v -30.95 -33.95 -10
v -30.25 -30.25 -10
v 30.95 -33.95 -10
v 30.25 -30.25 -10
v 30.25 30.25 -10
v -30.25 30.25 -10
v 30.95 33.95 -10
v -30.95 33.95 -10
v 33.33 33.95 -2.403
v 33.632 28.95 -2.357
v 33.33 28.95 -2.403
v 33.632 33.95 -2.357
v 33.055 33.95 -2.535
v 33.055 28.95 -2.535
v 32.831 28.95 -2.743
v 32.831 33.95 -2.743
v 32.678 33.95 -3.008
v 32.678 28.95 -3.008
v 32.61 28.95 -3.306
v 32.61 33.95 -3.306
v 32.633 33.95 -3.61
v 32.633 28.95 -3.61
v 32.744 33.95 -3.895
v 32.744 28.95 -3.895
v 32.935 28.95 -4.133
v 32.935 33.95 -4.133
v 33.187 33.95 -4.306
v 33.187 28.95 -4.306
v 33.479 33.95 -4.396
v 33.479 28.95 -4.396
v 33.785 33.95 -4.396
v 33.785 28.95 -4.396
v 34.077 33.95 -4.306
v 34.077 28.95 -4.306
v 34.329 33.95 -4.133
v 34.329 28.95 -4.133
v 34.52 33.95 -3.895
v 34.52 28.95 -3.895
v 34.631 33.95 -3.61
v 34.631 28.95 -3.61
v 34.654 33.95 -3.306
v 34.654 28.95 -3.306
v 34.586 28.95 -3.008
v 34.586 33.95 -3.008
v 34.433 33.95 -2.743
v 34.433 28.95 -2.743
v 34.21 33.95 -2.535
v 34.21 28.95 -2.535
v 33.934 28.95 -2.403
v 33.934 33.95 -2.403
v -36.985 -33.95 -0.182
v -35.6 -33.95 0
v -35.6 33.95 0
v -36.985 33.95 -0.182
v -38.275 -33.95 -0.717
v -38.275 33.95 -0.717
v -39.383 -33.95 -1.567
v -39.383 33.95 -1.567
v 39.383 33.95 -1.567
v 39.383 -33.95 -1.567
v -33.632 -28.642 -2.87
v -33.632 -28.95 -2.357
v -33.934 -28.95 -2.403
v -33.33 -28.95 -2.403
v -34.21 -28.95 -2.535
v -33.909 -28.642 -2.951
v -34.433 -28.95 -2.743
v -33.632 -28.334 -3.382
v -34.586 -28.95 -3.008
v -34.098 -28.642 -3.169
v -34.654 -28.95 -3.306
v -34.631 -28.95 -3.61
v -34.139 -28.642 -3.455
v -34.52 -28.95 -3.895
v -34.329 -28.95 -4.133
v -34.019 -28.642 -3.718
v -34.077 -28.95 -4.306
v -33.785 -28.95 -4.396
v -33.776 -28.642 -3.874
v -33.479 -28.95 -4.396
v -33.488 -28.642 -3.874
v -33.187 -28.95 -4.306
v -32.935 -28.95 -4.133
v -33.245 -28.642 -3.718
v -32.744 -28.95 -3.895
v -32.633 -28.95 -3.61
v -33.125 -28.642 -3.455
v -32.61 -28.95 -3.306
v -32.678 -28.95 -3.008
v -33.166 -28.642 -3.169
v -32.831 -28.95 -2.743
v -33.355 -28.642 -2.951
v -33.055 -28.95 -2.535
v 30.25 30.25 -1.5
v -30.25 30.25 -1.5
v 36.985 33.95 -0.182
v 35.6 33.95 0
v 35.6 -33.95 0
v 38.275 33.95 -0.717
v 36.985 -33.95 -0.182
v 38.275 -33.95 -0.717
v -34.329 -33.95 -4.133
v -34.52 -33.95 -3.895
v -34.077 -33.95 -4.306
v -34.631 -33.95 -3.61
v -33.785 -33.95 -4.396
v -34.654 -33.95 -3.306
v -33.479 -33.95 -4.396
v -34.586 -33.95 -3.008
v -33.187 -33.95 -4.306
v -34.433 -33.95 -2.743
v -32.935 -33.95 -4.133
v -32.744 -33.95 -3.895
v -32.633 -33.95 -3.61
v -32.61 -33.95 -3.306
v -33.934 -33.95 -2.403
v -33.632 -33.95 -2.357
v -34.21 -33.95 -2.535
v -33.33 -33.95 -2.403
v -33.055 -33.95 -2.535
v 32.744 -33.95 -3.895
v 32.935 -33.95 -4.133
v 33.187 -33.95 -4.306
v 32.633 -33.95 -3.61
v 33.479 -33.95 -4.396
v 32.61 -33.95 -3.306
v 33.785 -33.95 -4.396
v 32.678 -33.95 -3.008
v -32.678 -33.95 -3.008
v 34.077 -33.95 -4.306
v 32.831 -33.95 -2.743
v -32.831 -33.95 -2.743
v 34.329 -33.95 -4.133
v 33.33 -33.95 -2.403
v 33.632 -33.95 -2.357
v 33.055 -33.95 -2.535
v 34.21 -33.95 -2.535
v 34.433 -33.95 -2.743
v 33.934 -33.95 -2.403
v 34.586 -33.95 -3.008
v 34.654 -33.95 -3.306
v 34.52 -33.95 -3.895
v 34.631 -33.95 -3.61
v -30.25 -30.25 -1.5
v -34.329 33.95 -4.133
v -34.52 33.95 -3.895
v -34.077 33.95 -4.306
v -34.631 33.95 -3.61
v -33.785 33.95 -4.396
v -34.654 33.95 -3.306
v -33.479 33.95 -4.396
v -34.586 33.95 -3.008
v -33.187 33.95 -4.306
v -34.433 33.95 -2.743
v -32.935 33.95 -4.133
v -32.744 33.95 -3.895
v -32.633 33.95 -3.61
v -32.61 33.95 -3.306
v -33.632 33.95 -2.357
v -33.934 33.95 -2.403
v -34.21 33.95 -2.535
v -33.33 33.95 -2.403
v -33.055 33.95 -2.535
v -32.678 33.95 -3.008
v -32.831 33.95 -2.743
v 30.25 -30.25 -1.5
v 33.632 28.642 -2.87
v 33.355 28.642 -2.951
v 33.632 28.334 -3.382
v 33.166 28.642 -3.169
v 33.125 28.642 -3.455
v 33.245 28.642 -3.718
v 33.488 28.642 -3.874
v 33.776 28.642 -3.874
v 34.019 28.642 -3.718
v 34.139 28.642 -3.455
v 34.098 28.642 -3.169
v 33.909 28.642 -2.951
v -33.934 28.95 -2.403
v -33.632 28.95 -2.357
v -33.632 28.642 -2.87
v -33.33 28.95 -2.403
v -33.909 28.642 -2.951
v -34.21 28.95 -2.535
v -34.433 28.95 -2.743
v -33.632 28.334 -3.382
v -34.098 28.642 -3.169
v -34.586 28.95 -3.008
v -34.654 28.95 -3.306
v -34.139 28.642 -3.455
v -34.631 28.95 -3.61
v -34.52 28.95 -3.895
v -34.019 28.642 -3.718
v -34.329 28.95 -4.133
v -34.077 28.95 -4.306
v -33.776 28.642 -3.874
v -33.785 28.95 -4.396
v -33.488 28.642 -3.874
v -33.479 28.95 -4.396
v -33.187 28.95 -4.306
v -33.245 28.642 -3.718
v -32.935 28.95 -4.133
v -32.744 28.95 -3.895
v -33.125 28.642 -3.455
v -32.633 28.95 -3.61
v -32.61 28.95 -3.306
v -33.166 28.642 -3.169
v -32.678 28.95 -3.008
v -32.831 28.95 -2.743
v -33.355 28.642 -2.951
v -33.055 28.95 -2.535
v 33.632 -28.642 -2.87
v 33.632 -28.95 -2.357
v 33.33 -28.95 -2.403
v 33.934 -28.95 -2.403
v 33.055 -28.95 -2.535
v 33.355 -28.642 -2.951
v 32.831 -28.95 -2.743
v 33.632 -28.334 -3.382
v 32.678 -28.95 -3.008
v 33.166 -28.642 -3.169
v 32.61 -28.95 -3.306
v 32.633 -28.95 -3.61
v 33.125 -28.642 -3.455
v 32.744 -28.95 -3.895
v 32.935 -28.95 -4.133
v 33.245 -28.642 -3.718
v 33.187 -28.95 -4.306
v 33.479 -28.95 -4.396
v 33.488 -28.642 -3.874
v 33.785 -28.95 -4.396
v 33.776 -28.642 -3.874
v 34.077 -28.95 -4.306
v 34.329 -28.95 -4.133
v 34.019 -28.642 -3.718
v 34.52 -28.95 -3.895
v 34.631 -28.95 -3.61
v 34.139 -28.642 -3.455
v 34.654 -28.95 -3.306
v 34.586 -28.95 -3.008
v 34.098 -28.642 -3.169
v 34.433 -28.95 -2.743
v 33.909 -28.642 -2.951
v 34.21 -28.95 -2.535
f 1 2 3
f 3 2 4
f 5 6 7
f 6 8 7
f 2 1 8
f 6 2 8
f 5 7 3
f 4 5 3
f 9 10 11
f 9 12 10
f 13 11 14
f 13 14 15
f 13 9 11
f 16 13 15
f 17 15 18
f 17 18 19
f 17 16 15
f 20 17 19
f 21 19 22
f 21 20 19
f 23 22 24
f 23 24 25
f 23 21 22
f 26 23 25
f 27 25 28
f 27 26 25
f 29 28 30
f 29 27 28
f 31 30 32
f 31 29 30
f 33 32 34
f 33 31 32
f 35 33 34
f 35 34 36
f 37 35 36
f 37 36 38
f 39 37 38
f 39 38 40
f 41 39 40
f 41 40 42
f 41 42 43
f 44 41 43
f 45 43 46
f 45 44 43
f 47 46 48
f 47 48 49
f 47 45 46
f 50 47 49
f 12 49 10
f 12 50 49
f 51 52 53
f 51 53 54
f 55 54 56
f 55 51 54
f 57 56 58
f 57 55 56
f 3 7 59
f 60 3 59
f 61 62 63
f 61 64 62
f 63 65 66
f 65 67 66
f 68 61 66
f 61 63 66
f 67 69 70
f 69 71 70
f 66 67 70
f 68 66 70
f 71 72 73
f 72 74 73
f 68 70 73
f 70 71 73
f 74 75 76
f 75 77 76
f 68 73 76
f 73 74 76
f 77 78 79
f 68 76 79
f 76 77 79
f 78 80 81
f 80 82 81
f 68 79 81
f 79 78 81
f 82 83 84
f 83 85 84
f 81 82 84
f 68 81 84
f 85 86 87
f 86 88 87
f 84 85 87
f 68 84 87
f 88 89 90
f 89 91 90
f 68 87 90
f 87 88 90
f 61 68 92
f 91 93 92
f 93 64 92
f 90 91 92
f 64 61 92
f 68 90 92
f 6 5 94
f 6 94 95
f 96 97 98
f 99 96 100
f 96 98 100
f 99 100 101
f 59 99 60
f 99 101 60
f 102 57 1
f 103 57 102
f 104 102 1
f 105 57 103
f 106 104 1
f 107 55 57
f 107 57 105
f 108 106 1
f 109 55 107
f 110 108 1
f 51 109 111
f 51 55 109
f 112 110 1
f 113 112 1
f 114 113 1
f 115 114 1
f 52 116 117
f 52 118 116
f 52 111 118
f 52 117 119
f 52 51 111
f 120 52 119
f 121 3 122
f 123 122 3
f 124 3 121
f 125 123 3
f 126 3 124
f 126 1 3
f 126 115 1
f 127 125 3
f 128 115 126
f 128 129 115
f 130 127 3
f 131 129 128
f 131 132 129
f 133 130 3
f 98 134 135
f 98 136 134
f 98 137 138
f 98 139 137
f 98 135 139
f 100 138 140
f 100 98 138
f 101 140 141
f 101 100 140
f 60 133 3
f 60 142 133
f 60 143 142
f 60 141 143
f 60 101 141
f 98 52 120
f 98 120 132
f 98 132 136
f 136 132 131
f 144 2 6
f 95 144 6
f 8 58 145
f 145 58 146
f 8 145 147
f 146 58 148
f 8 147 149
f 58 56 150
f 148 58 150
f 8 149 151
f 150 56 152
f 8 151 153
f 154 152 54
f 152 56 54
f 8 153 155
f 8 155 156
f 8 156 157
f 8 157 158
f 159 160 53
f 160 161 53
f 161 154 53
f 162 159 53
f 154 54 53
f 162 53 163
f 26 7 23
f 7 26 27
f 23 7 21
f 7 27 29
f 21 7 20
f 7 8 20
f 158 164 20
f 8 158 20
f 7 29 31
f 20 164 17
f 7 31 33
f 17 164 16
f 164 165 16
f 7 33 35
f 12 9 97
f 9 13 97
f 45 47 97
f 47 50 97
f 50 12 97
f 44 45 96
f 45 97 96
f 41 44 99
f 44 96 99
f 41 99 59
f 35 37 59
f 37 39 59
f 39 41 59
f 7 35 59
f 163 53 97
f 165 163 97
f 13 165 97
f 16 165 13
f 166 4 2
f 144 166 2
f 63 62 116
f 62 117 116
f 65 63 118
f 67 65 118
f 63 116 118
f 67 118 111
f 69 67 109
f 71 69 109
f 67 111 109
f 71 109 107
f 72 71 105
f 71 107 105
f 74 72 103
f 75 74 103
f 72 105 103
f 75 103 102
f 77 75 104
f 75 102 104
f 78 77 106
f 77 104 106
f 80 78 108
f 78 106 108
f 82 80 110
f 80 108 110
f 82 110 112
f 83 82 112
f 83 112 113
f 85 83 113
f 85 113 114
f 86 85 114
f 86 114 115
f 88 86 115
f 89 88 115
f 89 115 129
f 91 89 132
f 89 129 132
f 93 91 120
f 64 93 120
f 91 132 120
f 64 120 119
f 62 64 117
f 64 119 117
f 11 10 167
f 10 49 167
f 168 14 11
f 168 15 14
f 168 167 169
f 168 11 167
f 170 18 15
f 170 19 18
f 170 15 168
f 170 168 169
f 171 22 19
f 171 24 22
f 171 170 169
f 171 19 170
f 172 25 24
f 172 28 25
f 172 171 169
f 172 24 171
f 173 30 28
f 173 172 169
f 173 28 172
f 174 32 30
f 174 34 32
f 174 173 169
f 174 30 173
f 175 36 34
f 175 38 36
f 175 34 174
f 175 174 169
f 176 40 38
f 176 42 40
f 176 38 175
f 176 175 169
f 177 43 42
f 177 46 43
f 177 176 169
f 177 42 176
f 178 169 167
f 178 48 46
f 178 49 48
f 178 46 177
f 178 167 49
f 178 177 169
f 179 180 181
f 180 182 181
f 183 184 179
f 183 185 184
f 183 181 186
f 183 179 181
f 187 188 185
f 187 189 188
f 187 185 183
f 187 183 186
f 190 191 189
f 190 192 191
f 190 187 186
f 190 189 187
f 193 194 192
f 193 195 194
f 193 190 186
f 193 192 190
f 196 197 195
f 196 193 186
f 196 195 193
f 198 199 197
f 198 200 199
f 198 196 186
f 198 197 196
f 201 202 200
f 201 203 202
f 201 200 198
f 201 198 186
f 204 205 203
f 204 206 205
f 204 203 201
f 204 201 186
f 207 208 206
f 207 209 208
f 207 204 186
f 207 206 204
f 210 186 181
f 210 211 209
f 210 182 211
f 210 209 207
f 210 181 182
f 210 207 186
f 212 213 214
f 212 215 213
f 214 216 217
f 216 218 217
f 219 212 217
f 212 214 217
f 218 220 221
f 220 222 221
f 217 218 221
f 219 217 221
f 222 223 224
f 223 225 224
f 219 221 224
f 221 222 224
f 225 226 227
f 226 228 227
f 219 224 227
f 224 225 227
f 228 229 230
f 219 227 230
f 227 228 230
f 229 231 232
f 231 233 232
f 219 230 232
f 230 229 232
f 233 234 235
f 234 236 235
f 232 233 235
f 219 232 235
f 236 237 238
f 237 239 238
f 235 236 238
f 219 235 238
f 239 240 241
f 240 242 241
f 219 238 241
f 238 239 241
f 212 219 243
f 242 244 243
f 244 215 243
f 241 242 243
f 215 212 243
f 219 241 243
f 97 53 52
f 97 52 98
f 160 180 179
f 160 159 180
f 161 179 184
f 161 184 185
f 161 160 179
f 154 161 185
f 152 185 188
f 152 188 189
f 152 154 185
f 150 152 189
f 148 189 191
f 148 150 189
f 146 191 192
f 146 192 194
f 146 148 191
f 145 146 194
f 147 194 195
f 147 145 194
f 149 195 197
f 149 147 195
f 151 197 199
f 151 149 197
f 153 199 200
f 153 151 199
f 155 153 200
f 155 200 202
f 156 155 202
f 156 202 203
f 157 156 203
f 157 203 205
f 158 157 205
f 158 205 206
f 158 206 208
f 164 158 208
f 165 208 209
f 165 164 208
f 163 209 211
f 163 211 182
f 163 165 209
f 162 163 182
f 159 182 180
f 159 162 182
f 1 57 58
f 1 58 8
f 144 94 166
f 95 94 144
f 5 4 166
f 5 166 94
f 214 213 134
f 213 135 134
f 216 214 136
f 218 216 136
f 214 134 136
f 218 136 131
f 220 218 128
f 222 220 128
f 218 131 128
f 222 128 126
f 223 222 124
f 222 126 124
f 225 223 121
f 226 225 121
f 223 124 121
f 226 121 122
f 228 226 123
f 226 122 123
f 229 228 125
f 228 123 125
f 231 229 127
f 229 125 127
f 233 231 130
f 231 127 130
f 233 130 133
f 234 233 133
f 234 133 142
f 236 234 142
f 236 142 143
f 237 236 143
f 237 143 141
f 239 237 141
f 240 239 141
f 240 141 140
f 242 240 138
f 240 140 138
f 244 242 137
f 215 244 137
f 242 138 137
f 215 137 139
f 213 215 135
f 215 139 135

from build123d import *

# Parameters (mm, degrees)
SKETCH_1_W            = 81.9
SKETCH_1_H            = 67.9
EXTRUDE_1_DEPTH       = 10
SKETCH_2_W            = 60.5
SKETCH_2_H            = 60.5
CUT_EXTRUDE_1_DEPTH   = 8.5
CUT_EXTRUDE_4_REACH   = 91.242
M2_5X0_451_AT_2_COUNT = 2
M2_5X0_451_AT_2_PITCH = 67.264213562
CUT_EXTRUDE_5_REACH   = 81.921


with BuildPart() as part:
    # Эскиз1 → Бобышка-Вытянуть1 (new body)
    with BuildSketch(Plane.XY):
        Rectangle(SKETCH_1_W, SKETCH_1_H)
    extrude(amount=-EXTRUDE_1_DEPTH)

    # Эскиз2 → Вырез-Вытянуть1 (cut)
    with BuildSketch(Plane(origin=(0, 0, -10), x_dir=(-1, 0, 0), z_dir=(0, 0, -1))):
        Rectangle(SKETCH_2_W, SKETCH_2_H)
    extrude(amount=-CUT_EXTRUDE_1_DEPTH, mode=Mode.SUBTRACT)

    # Эскиз4 → Вырез-Вытянуть4 (cut, up to next)
    with BuildSketch(Plane(origin=(0, -33.95, -40.95), x_dir=(1, 0, 0), z_dir=(0, 1, 0)), mode=Mode.PRIVATE) as cut_extrude_4_sk1:
        with BuildLine():
            Line((39.383021279, -39.383021279), (40.95, -40.95))
            Line((40.95, -40.95), (35.6, -40.95))
            ThreePointArc((35.6, -40.95), (37.647356363, -40.542755499), (39.383021279, -39.383021279))
        make_face()
    cut_extrude_4_tool1 = extrude(cut_extrude_4_sk1.sketch, amount=CUT_EXTRUDE_4_REACH, mode=Mode.PRIVATE) & part.part
    # Эскиз4 → Вырез-Вытянуть4 (cut, up to next)
    with BuildSketch(Plane(origin=(0, -33.95, -40.95), x_dir=(1, 0, 0), z_dir=(0, 1, 0)), mode=Mode.PRIVATE) as cut_extrude_4_sk2:
        with BuildLine():
            Line((-40.95, -40.95), (-35.6, -40.95))
            ThreePointArc((-35.6, -40.95), (-37.647356363, -40.542755499), (-39.383021279, -39.383021279))
            Line((-39.383021279, -39.383021279), (-40.95, -40.95))
        make_face()
    cut_extrude_4_tool2 = extrude(cut_extrude_4_sk2.sketch, amount=CUT_EXTRUDE_4_REACH, mode=Mode.PRIVATE) & part.part
    add(cut_extrude_4_tool1.solids().sort_by_distance((39.042099, -33.95, -0.482136))[0], mode=Mode.SUBTRACT)
    add(cut_extrude_4_tool2.solids().sort_by_distance((-39.042099, -33.95, -0.482136))[0], mode=Mode.SUBTRACT)

    # Эскиз8 → Отверстие обработанное метчиком M2.5x0.451 (revolve, cut)
    with BuildSketch(Plane(origin=(33.632106781, 33.95, -3.382106781), x_dir=(0, 0, 1), z_dir=(1, 0, 0))):
        Polygon((0, 0), (0, 5.615882135), (1.025, 5), (1.025, 0), align=None)
    m2_5x0_451 = revolve(axis=Axis((33.632106781, 40.3, -3.382106781), (0, -1, 0)), mode=Mode.SUBTRACT)

    # Отверстие обработанное метчиком M2.5x0.451 at 2: Отверстие обработанное метчиком M2.5x0.451 ×2
    with Locations(*[(-i * M2_5X0_451_AT_2_PITCH, 0, 0) for i in range(1, M2_5X0_451_AT_2_COUNT)]):
        add(m2_5x0_451, mode=Mode.SUBTRACT)

    # Зеркальное отражение1: Отверстие обработанное метчиком M2.5x0.451 across plane
    add(m2_5x0_451.mirror(Plane.ZX), mode=Mode.SUBTRACT)

    # Зеркальное отражение1 copy 1 sketch → Зеркальное отражение1 copy 1 (revolve, cut)
    with BuildSketch(Plane(origin=(-33.632106781, -33.95, -3.382106781), x_dir=(0, 0, 1), z_dir=(1, 0, 0))):
        Polygon((0, 0), (0, -5.615882135), (1.025, -5), (1.025, 0), align=None)
    revolve(axis=Axis((-33.632106781, -40.3, -3.382106781), (0, -1, 0)), mode=Mode.SUBTRACT)

    # Эскиз3 → Вырез-Вытянуть5 (cut, up to next)
    with BuildSketch(Plane(origin=(0, 33.95, 0), x_dir=(1, 0, 0), z_dir=(0, 1, 0)), mode=Mode.PRIVATE) as cut_extrude_5_sk1:
        Polygon((30.95, 10), (40.95, 0), (40.95, 10), align=None)
    cut_extrude_5_tool1 = extrude(cut_extrude_5_sk1.sketch, amount=-CUT_EXTRUDE_5_REACH, mode=Mode.PRIVATE) & part.part
    # Эскиз3 → Вырез-Вытянуть5 (cut, up to next)
    with BuildSketch(Plane(origin=(0, 33.95, 0), x_dir=(1, 0, 0), z_dir=(0, 1, 0)), mode=Mode.PRIVATE) as cut_extrude_5_sk2:
        Polygon((-30.95, 10), (-40.95, 10), (-40.95, 0), align=None)
    cut_extrude_5_tool2 = extrude(cut_extrude_5_sk2.sketch, amount=-CUT_EXTRUDE_5_REACH, mode=Mode.PRIVATE) & part.part
    add(cut_extrude_5_tool1.solids().sort_by_distance((37.616667, 33.95, -6.666667))[0], mode=Mode.SUBTRACT)
    add(cut_extrude_5_tool2.solids().sort_by_distance((-37.616667, 33.95, -6.666667))[0], mode=Mode.SUBTRACT)


solid = part.part
